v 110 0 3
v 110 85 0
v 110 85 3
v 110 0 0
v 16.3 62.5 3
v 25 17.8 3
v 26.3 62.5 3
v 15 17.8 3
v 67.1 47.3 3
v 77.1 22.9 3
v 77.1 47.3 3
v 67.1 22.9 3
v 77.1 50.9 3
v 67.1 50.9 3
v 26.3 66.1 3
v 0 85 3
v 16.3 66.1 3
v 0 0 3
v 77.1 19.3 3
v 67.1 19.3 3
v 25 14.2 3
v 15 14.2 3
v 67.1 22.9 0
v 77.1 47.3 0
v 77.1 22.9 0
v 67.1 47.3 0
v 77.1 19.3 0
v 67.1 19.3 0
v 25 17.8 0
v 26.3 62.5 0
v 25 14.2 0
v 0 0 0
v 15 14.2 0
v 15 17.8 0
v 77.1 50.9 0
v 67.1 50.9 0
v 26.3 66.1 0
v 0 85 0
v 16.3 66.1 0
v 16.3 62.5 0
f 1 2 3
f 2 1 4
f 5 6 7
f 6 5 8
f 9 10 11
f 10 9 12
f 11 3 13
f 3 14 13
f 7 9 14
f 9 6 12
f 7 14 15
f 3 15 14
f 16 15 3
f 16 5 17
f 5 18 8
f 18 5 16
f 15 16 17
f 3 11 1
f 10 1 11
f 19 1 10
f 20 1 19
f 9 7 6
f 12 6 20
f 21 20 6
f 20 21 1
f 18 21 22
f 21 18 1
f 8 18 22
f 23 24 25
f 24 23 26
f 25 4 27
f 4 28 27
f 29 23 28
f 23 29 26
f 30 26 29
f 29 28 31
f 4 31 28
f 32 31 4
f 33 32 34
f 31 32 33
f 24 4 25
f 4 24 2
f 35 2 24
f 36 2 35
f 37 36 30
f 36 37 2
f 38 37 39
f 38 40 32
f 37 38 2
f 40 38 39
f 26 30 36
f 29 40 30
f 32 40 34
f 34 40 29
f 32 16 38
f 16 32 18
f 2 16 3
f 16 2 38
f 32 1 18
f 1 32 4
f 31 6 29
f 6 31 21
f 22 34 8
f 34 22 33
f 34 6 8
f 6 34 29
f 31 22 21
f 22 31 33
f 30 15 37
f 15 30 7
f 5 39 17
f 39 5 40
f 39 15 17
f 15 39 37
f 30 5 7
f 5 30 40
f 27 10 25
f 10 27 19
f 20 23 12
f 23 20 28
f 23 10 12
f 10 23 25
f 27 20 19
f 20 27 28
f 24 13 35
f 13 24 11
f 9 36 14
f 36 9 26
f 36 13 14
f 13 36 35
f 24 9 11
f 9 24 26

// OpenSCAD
// TEMPLATE ONLY. Measure and edit before printing. Millimetres.
difference(){union(){
translate([0, 0, 0]) cube([110, 85, 3]);
}
translate([15, 14.2, -1]) cube([10, 3.6000000000000014, 5]);
translate([16.3, 62.5, -1]) cube([10.0, 3.5999999999999943, 5]);
translate([67.1, 19.3, -1]) cube([10.0, 3.6000000000000014, 5]);
translate([67.1, 47.300000000000004, -1]) cube([10.0, 3.5999999999999943, 5]);
}
